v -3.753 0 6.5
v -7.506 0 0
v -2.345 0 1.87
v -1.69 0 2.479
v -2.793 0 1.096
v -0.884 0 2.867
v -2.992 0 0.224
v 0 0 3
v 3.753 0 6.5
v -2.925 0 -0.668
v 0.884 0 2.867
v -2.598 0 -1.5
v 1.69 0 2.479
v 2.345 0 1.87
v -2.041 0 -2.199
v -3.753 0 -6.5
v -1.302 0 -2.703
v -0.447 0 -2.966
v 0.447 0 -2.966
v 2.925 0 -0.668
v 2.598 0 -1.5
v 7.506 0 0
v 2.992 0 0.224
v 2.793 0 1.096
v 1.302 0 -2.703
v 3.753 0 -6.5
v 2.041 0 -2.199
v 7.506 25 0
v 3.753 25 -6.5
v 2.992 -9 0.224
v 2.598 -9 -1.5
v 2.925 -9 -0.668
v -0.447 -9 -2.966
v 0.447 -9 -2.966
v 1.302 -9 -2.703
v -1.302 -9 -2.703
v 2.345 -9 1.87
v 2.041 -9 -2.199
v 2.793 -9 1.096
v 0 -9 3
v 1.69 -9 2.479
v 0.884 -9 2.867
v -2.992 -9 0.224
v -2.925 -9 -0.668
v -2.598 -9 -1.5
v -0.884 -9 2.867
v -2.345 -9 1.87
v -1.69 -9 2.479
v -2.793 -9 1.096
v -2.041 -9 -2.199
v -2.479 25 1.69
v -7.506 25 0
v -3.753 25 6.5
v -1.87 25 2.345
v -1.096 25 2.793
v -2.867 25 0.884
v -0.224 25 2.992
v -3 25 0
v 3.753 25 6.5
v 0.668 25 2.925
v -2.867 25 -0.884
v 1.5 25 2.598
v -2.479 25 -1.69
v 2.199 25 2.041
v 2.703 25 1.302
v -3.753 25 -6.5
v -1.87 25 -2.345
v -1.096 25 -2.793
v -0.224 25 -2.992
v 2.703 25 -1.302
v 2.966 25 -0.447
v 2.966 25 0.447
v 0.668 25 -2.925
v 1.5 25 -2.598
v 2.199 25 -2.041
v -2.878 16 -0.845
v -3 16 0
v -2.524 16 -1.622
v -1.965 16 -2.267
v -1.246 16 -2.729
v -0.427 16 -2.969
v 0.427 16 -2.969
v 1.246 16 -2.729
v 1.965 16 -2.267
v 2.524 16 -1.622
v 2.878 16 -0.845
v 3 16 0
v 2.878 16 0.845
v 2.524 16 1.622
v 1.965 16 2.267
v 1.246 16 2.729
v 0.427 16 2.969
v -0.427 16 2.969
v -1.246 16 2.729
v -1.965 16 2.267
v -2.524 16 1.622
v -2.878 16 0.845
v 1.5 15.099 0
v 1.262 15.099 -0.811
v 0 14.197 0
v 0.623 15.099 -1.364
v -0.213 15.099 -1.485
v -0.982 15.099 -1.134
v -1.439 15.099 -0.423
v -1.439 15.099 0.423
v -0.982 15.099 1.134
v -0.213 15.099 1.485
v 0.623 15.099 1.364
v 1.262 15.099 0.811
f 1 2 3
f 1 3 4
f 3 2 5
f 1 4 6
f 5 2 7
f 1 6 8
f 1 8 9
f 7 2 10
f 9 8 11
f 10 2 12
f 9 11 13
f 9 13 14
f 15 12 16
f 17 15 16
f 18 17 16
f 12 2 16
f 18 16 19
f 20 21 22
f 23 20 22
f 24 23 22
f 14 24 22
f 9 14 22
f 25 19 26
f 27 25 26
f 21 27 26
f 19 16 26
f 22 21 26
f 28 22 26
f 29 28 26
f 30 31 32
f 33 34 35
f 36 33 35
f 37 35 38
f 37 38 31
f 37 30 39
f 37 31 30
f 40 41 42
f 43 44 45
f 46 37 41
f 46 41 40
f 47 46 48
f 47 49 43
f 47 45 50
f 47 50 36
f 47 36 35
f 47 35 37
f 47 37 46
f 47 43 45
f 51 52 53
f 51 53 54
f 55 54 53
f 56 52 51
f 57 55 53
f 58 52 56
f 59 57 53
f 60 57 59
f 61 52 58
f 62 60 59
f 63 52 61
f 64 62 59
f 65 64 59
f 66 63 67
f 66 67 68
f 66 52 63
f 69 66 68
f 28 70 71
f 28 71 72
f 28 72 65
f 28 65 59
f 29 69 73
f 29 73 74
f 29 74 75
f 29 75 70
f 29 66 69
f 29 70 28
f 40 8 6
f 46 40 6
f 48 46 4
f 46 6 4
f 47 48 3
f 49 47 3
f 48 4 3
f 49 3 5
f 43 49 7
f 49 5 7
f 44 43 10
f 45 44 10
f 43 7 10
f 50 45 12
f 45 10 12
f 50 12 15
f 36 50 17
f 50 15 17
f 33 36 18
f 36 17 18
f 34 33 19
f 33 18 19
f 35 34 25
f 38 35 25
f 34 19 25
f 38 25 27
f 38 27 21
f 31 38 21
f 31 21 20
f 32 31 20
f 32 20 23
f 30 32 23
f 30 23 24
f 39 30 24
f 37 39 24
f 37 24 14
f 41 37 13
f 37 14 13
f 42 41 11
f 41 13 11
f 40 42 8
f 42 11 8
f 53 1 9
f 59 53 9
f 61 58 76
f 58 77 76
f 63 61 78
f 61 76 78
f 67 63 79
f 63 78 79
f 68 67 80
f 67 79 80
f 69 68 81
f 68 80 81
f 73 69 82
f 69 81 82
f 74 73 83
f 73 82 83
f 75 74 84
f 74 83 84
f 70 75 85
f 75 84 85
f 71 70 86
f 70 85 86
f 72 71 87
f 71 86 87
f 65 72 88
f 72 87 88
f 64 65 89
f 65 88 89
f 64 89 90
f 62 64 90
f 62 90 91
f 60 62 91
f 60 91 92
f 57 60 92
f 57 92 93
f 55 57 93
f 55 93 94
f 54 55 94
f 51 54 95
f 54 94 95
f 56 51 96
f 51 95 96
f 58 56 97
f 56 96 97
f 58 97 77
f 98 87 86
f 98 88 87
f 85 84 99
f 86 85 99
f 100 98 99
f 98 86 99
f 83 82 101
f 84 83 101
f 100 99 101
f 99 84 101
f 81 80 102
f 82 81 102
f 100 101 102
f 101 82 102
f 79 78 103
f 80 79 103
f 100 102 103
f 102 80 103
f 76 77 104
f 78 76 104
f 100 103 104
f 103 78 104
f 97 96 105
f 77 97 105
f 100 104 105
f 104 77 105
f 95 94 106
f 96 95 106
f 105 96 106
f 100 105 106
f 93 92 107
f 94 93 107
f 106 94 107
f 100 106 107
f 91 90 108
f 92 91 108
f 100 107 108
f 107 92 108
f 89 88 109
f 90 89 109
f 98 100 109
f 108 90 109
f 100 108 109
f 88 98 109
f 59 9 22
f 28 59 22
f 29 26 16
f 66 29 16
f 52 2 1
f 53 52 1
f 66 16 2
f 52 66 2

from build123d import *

# Parameters (mm, degrees)
BOSS_EXTRUDE1_DEPTH       = 25
SKETCH2_R                 = 3
BOSS_EXTRUDE2_DEPTH       = 9
F_6_0MM_DOWEL_HOLE1_D     = 6
F_6_0MM_DOWEL_HOLE1_DEPTH = 9
F_6_0MM_DOWEL_HOLE1_TIP   = 1.802581857


with BuildPart() as part:
    # Sketch1 → Boss-Extrude1 (new body)
    with BuildSketch(Plane(origin=(0, 0, 0), x_dir=(1, 0, 0), z_dir=(0, 1, 0))):
        Polygon((7.505553499, 0), (3.75277675, 6.5), (-3.75277675, 6.5), (-7.505553499, 0), (-3.75277675, -6.5), (3.75277675, -6.5), align=None)
    extrude(amount=BOSS_EXTRUDE1_DEPTH)

    # Sketch2 → Boss-Extrude2 (add)
    with BuildSketch(Plane.XZ):
        with Locations(Location((0, 0, 0), (0, 0, 90))):
            Circle(SKETCH2_R)
    extrude(amount=BOSS_EXTRUDE2_DEPTH)

    # Ø6.0mm Dowel Hole1
    with Locations(Plane(origin=(0, 25, 0), x_dir=(1, 0, 0), z_dir=(0, 1, 0))):
        with Locations((0, 0)):
            Hole(F_6_0MM_DOWEL_HOLE1_D / 2, depth=F_6_0MM_DOWEL_HOLE1_DEPTH)
            with Locations((0, 0, -(F_6_0MM_DOWEL_HOLE1_DEPTH + F_6_0MM_DOWEL_HOLE1_TIP / 2))):  # 118° drill point
                Cone(0, F_6_0MM_DOWEL_HOLE1_D / 2, F_6_0MM_DOWEL_HOLE1_TIP, mode=Mode.SUBTRACT)


solid = part.part
